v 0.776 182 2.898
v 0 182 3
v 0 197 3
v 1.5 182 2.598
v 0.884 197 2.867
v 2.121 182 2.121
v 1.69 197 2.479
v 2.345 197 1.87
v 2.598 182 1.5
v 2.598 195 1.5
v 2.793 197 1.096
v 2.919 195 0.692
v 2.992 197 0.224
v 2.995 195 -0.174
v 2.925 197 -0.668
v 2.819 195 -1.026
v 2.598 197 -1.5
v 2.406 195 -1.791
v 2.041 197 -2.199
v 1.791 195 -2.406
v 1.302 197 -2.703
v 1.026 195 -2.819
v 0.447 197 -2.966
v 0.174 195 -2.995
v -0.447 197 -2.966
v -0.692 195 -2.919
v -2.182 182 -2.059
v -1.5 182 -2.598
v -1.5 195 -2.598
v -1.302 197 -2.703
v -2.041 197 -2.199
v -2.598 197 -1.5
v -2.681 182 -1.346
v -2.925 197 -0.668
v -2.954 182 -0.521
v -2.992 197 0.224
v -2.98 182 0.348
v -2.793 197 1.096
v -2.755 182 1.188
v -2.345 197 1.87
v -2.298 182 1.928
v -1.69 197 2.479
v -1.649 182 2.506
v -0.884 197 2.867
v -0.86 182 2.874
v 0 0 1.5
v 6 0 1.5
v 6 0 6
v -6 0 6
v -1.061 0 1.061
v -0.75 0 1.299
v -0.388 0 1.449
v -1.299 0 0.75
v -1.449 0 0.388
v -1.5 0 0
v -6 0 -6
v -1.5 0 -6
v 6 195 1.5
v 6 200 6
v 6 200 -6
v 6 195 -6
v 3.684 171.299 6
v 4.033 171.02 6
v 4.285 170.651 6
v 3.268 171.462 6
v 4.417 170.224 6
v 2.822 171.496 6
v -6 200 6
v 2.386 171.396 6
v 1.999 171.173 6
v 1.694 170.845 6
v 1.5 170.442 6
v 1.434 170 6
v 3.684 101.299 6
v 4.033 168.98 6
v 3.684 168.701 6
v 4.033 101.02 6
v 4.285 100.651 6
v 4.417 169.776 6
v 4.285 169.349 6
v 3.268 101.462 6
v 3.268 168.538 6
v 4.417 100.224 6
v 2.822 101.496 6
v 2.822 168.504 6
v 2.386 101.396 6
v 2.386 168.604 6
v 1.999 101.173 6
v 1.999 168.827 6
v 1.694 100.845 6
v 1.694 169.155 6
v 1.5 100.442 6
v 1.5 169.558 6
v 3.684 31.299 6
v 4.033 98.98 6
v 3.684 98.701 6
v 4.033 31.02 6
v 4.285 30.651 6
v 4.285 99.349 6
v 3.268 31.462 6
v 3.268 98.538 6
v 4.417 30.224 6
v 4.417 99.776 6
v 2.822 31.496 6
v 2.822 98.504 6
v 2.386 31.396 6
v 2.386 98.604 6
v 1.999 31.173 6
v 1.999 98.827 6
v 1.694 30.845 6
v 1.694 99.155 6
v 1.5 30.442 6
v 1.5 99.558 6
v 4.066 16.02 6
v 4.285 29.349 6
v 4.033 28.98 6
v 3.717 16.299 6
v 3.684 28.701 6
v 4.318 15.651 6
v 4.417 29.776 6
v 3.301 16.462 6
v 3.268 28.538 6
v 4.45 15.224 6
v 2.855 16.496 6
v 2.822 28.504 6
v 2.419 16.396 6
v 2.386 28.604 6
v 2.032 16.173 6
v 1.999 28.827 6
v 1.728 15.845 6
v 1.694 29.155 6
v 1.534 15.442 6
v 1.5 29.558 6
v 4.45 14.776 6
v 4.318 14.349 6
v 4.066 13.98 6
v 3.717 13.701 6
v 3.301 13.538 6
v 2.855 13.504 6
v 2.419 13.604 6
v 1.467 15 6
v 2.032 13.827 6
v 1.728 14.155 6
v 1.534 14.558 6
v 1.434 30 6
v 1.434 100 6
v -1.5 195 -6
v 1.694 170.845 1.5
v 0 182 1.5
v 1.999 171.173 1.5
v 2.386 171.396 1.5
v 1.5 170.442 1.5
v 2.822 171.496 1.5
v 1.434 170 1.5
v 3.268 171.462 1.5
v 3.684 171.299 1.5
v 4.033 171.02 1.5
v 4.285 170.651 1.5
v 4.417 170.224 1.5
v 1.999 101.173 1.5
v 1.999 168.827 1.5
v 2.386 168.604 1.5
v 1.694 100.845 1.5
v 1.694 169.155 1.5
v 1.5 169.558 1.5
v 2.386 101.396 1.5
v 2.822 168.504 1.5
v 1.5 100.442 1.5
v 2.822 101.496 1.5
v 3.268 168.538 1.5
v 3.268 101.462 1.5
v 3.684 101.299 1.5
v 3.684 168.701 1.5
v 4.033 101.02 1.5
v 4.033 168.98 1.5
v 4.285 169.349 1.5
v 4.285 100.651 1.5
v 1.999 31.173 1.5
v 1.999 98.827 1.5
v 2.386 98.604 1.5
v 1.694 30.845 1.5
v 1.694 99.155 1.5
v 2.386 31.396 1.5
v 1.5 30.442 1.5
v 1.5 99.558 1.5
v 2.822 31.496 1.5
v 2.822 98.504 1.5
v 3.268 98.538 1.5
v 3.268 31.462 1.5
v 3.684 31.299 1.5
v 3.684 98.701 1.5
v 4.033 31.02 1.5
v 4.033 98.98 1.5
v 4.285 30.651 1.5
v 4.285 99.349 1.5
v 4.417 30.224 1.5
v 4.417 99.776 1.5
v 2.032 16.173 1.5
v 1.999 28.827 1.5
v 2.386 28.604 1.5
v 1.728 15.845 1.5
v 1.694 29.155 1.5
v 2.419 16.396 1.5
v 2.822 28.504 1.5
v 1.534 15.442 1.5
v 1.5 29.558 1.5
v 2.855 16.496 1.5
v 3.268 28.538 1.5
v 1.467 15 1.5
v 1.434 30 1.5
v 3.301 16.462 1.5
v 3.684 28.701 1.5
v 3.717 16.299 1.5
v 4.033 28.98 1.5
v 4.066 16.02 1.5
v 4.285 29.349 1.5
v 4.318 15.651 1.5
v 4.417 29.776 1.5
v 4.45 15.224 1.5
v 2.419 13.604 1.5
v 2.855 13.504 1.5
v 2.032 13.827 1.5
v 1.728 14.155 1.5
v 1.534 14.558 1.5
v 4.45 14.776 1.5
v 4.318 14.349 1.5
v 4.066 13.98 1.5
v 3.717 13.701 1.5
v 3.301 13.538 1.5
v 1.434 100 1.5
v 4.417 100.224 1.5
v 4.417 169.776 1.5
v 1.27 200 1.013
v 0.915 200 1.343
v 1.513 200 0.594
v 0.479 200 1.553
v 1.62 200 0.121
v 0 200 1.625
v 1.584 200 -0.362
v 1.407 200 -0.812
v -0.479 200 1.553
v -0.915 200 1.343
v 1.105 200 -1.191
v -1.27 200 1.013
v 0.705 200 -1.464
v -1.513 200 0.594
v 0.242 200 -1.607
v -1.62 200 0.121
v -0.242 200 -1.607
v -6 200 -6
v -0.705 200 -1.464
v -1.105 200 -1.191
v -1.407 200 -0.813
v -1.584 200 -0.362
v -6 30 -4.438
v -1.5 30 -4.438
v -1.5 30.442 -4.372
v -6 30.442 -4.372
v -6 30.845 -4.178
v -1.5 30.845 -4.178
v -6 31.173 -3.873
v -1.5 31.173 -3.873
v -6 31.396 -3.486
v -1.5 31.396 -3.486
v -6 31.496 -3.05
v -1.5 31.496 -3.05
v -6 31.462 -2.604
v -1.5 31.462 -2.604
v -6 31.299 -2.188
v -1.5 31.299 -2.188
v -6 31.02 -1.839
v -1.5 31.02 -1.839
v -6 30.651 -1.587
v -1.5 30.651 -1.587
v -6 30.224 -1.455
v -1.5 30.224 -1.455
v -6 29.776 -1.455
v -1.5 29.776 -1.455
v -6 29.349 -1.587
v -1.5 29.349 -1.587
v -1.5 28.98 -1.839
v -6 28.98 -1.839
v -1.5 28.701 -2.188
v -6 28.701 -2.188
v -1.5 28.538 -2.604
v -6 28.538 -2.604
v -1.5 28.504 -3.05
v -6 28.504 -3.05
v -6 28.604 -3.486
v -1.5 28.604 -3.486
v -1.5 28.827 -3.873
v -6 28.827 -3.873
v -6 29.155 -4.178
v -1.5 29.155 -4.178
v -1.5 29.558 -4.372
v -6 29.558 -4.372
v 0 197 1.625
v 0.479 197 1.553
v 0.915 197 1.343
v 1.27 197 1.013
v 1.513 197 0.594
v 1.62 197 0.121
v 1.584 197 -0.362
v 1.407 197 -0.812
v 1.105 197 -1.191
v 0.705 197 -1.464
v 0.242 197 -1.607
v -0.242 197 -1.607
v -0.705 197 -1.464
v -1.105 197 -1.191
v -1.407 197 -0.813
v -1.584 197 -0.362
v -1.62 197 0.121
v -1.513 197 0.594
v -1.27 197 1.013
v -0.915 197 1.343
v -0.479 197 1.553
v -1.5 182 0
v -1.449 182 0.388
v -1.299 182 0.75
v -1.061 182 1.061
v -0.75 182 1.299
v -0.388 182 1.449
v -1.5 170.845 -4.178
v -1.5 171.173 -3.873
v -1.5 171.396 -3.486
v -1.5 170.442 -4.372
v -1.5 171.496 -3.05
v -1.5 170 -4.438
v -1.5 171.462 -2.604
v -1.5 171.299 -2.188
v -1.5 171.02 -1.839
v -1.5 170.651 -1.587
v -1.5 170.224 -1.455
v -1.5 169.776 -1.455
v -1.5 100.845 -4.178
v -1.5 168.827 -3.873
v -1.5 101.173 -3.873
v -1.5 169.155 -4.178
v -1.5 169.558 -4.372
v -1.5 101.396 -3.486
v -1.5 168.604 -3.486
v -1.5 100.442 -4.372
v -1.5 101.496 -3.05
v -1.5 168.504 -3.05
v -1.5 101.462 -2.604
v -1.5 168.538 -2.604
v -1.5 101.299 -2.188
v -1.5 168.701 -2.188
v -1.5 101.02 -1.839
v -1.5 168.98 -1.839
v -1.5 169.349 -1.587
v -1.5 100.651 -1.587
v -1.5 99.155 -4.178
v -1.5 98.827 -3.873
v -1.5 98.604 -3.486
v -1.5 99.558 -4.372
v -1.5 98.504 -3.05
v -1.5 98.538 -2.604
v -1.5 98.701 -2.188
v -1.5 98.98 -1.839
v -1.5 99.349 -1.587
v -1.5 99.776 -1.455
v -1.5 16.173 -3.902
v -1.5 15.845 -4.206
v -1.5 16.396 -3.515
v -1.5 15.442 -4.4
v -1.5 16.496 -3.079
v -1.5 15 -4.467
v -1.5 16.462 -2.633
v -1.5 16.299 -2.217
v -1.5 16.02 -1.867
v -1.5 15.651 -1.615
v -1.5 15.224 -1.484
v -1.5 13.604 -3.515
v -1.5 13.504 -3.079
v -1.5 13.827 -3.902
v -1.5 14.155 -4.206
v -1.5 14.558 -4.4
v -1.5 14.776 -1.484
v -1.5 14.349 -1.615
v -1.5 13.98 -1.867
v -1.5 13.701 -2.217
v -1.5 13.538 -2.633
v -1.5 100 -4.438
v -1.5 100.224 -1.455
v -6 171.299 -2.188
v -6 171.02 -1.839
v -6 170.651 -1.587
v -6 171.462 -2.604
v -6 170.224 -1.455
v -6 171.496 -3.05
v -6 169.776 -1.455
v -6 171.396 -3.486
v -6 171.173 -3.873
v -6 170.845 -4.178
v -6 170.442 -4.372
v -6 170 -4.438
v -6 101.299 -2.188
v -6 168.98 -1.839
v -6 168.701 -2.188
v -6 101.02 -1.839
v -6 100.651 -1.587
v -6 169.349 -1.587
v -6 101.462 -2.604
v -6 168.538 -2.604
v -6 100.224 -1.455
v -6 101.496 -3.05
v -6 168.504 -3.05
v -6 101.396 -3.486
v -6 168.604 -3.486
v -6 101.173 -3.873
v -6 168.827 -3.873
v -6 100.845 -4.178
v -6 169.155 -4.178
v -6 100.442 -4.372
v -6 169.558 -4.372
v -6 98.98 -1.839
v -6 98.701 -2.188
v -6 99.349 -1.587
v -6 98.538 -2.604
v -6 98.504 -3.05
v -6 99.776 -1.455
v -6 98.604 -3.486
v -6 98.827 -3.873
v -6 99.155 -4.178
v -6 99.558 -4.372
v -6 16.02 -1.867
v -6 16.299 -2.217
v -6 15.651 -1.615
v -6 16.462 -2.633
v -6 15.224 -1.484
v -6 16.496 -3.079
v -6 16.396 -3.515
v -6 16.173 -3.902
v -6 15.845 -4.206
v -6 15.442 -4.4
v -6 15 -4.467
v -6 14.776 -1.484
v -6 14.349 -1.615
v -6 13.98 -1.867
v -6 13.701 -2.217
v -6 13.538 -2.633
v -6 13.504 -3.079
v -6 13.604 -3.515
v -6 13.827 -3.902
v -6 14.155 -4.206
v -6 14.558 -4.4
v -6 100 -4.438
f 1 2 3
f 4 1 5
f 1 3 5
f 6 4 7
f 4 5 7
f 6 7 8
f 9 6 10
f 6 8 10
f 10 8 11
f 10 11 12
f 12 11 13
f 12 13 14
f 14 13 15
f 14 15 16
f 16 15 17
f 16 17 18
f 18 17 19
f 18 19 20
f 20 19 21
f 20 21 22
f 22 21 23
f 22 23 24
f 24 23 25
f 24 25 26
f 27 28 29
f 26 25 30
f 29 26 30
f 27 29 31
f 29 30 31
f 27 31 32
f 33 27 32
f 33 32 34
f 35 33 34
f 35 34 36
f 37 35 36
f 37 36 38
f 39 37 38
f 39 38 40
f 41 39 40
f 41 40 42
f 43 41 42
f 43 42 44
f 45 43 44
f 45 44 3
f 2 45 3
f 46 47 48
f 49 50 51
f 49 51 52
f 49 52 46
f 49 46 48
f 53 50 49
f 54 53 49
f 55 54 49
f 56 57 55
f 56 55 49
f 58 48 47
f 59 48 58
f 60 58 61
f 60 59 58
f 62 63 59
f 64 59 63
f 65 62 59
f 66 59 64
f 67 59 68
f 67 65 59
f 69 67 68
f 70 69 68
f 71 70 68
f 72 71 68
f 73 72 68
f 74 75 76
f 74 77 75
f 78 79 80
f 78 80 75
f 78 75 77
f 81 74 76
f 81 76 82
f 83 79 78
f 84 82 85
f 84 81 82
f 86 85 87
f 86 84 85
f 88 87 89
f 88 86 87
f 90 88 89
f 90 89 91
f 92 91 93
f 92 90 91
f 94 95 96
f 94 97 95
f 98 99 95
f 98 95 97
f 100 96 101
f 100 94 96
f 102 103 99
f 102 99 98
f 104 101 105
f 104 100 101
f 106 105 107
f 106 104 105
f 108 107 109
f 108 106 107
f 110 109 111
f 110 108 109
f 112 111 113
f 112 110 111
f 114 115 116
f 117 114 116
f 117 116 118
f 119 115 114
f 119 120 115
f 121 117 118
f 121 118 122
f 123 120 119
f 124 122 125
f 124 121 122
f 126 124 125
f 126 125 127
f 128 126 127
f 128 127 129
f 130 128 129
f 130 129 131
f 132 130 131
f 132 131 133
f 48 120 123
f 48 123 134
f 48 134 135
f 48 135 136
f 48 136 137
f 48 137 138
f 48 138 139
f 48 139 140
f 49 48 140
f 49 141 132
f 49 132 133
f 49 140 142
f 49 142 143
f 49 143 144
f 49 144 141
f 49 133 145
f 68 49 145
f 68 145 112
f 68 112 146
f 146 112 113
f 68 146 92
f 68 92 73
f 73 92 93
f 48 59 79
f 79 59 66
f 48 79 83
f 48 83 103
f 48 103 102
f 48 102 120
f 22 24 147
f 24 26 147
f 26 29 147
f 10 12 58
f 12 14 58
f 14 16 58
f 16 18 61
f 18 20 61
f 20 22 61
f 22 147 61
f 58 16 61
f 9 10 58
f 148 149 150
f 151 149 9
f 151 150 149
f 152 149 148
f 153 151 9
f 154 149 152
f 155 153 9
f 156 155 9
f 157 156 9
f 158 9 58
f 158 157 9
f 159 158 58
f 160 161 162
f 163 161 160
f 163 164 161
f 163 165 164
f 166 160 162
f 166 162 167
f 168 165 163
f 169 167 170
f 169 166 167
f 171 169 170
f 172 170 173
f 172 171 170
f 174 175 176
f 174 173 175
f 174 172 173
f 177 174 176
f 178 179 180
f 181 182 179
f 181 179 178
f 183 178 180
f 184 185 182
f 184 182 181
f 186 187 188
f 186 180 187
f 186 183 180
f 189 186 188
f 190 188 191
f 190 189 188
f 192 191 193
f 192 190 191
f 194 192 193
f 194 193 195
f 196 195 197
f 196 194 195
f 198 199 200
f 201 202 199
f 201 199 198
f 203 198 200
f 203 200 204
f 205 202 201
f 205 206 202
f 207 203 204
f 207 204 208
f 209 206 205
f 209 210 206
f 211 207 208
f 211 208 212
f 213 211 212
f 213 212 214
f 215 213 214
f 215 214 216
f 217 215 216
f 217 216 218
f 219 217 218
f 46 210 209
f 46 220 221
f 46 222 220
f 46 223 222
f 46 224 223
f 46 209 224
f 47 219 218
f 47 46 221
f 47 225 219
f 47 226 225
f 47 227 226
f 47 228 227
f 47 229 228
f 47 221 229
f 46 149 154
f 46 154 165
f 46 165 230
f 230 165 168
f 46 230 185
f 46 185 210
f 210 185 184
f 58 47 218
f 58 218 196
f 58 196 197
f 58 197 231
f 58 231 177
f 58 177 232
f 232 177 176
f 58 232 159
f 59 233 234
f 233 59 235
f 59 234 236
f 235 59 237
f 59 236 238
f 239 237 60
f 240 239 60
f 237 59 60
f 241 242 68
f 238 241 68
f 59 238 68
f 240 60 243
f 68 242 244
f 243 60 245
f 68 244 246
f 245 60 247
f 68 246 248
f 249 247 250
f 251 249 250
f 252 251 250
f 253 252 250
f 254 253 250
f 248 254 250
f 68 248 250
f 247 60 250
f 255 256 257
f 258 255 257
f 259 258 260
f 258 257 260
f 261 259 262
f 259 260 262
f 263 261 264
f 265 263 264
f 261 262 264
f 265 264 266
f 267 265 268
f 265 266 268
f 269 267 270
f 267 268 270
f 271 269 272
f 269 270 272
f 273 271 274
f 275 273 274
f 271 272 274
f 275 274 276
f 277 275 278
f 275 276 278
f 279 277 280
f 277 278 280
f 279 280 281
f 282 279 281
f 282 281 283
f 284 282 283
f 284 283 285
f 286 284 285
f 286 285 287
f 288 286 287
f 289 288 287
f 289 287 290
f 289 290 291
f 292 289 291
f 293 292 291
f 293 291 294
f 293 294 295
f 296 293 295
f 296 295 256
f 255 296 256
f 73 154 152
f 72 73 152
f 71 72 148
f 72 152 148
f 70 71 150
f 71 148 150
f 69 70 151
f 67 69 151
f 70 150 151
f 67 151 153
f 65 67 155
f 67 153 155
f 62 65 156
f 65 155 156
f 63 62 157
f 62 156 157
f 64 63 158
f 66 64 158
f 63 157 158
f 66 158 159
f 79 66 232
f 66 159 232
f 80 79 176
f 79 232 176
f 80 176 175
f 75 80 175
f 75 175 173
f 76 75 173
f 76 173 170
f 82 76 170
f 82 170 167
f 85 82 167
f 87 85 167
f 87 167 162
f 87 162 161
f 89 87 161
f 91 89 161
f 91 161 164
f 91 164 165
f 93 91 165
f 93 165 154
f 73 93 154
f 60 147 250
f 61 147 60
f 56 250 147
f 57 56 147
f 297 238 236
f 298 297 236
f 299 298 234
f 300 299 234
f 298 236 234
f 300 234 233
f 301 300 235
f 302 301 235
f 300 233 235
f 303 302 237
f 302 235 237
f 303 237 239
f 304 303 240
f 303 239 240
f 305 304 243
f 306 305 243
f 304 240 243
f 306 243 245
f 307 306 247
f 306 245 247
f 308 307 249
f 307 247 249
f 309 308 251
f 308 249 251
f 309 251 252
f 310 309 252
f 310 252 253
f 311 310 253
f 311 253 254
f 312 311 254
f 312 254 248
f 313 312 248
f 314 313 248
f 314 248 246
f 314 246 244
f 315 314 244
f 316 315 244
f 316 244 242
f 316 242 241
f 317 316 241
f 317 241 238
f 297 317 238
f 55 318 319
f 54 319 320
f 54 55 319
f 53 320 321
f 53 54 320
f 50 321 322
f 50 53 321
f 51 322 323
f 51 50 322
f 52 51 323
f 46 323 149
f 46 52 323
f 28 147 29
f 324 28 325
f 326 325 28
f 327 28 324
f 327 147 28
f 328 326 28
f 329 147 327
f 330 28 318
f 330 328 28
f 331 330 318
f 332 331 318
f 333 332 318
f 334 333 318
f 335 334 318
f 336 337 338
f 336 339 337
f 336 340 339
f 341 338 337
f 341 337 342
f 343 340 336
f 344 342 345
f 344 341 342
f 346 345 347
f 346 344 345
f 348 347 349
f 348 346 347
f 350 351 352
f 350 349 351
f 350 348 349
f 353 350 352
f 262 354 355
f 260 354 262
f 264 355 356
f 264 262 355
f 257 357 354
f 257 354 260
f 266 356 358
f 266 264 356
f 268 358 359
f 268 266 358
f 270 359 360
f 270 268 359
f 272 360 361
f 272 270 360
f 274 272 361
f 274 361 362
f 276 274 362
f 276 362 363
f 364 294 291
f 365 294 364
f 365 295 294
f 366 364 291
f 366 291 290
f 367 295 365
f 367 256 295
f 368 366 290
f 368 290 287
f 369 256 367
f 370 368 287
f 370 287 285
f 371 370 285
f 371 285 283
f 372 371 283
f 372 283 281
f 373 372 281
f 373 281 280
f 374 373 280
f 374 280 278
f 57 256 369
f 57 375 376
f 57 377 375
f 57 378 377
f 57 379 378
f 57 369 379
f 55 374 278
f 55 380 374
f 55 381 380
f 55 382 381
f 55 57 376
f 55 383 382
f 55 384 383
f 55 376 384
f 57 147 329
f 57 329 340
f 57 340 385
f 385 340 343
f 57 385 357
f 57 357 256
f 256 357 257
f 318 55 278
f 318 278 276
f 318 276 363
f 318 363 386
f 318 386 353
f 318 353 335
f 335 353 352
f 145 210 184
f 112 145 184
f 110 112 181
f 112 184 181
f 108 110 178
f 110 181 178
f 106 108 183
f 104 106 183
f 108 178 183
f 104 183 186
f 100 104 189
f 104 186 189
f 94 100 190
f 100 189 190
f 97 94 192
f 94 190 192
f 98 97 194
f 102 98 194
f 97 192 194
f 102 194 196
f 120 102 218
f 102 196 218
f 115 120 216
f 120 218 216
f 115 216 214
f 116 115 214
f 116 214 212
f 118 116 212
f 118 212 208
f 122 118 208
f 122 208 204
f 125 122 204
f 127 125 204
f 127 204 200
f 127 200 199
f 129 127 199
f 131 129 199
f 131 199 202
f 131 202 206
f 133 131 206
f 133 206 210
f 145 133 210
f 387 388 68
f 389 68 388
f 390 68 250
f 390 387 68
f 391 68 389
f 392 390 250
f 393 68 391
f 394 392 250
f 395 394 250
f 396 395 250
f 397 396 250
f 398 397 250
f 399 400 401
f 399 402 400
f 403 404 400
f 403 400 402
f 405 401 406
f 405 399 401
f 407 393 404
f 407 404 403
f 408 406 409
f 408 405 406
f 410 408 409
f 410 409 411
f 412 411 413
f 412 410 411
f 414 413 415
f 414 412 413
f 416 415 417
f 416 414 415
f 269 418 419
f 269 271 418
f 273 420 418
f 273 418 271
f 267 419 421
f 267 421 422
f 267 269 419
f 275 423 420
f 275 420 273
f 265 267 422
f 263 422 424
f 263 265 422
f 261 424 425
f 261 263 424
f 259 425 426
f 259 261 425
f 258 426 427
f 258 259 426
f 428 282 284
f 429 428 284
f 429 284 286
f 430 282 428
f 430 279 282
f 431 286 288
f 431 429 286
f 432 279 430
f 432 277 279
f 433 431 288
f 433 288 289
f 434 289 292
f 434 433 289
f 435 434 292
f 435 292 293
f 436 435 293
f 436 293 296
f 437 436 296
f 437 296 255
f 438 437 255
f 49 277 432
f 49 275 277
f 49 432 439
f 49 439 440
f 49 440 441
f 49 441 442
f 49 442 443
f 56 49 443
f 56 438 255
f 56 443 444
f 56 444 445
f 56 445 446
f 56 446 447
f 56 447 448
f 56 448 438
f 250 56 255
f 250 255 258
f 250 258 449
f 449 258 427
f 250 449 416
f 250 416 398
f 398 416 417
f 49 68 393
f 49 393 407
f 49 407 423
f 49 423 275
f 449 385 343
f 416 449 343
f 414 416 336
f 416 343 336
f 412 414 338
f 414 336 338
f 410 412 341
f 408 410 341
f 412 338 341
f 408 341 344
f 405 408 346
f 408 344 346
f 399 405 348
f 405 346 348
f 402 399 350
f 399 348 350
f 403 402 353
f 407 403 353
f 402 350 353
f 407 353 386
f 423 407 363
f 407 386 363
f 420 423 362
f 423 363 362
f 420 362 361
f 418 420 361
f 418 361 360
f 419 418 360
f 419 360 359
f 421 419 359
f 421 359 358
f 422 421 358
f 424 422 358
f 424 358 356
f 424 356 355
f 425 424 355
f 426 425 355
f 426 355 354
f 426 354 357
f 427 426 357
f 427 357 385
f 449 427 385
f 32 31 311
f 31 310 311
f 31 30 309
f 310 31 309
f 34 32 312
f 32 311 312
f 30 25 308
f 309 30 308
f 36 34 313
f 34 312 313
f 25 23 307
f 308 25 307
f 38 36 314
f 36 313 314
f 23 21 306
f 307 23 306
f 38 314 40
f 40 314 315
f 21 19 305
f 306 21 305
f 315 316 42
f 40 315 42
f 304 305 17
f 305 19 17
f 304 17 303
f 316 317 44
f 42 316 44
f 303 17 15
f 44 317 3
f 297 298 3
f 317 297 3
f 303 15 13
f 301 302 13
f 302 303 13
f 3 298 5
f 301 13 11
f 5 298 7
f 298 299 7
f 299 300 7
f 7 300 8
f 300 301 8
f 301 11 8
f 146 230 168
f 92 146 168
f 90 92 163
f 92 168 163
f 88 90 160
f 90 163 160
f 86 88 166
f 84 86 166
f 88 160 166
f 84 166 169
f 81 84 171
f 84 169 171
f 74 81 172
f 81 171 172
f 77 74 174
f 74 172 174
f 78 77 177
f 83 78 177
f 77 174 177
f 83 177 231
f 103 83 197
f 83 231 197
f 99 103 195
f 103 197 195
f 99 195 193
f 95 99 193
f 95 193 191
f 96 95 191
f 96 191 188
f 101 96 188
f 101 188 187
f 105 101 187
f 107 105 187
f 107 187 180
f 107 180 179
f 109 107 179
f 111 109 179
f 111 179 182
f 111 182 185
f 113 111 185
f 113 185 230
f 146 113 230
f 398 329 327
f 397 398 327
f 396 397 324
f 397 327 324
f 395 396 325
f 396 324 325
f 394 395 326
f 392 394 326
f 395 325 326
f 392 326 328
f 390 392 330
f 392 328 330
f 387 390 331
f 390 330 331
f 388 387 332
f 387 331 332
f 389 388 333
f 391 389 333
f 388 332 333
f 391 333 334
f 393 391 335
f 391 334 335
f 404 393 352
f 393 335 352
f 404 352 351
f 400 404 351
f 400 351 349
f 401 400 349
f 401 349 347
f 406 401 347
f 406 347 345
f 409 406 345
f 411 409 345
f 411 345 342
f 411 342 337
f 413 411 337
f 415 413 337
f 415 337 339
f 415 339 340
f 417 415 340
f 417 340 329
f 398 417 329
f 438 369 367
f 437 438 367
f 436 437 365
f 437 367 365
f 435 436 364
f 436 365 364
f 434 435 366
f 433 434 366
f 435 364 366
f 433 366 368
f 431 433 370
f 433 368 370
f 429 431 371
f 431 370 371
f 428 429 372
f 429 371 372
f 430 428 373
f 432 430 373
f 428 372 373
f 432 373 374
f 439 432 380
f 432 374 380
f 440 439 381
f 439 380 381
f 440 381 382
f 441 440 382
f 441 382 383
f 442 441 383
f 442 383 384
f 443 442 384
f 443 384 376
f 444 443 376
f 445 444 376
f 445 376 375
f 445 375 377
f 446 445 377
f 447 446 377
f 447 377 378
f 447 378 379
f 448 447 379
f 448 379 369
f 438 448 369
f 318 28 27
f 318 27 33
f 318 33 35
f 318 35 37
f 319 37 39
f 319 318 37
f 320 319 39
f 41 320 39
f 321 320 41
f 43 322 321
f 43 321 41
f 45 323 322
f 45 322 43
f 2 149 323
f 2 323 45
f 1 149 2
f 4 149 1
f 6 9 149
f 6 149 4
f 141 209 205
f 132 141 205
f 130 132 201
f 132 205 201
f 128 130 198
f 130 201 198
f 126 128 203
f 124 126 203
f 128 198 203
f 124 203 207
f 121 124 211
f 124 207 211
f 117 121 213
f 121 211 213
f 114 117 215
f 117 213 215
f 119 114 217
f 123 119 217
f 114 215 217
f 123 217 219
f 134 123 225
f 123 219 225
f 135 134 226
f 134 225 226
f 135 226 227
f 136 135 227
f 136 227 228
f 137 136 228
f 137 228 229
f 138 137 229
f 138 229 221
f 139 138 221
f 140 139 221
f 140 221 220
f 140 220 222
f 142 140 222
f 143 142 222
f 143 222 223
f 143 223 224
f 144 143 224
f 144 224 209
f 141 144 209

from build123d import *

# Parameters (mm, degrees)
BOSS_EXTRUDE1_DEPTH = 200
SKETCH2_W           = 12
SKETCH2_H           = 12
BOSS_EXTRUDE2_DEPTH = 5
SKETCH3_R           = 1.625
CUT_EXTRUDE1_DEPTH  = 15
CUT_EXTRUDE3_START  = -3
SKETCH6_R           = 3
CUT_EXTRUDE3_DEPTH  = 15
SKETCH7_R           = 1.5
CUT_EXTRUDE4_DEPTH  = 8
SKETCH8_R           = 1.5
CUT_EXTRUDE5_DEPTH  = 8


with BuildPart() as part:
    # Sketch1 → Boss-Extrude1 (new body)
    with BuildSketch(Plane(origin=(0, 0, 0), x_dir=(1, 0, 0), z_dir=(0, 1, 0))):
        with BuildLine():
            Line((-6, 6), (-1.5, 6))
            Line((-1.5, 6), (-1.5, 0))
            ThreePointArc((-1.5, 0), (-1.060660172, -1.060660172), (0, -1.5))
            Line((0, -1.5), (6, -1.5))
            Line((6, -1.5), (6, -6))
            Line((6, -6), (-6, -6))
            Line((-6, -6), (-6, 6))
        make_face()
    extrude(amount=BOSS_EXTRUDE1_DEPTH)

    # Sketch2 → Boss-Extrude2 (add)
    with BuildSketch(Plane(origin=(0, 200, 0), x_dir=(1, 0, 0), z_dir=(0, 1, 0))):
        Rectangle(SKETCH2_W, SKETCH2_H)
    extrude(amount=-BOSS_EXTRUDE2_DEPTH)

    # Sketch3 → Cut-Extrude1 (cut)
    with BuildSketch(Plane(origin=(0, 200, 0), x_dir=(1, 0, 0), z_dir=(0, 1, 0))):
        with Locations(Location((0, 0, 0), (0, 0, 270))):
            Circle(SKETCH3_R)
    extrude(amount=-CUT_EXTRUDE1_DEPTH, mode=Mode.SUBTRACT)

    # Sketch6 → Cut-Extrude3 (cut)
    with BuildSketch(Plane(origin=(0, 200, 0), x_dir=(1, 0, 0), z_dir=(0, 1, 0)).offset(CUT_EXTRUDE3_START)):
        with Locations(Location((0, 0, 0), (0, 0, 270))):
            Circle(SKETCH6_R)
    extrude(amount=-CUT_EXTRUDE3_DEPTH, mode=Mode.SUBTRACT)

    # Sketch7 → Cut-Extrude4 (cut)
    with BuildSketch(Plane(origin=(0, 0, 1.5), x_dir=(-1, 0, 0), z_dir=(0, 0, -1))):
        with Locations((-2.933748826, 30)):
            Circle(SKETCH7_R)
        with Locations((-2.933748826, 100)):
            Circle(SKETCH7_R)
        with Locations((-2.933748826, 170)):
            Circle(SKETCH7_R)
        with Locations((-2.966874413, 15)):
            Circle(SKETCH7_R)
    extrude(amount=-CUT_EXTRUDE4_DEPTH, mode=Mode.SUBTRACT)

    # Sketch8 → Cut-Extrude5 (cut)
    with BuildSketch(Plane(origin=(-1.5, 0, 0), x_dir=(0, 0, -1), z_dir=(1, 0, 0))):
        with Locations((2.938165571, 30)):
            Circle(SKETCH8_R)
        with Locations((2.938165571, 100)):
            Circle(SKETCH8_R)
        with Locations((2.938165571, 170)):
            Circle(SKETCH8_R)
        with Locations((2.966874413, 15)):
            Circle(SKETCH8_R)
    extrude(amount=-CUT_EXTRUDE5_DEPTH, mode=Mode.SUBTRACT)


solid = part.part
